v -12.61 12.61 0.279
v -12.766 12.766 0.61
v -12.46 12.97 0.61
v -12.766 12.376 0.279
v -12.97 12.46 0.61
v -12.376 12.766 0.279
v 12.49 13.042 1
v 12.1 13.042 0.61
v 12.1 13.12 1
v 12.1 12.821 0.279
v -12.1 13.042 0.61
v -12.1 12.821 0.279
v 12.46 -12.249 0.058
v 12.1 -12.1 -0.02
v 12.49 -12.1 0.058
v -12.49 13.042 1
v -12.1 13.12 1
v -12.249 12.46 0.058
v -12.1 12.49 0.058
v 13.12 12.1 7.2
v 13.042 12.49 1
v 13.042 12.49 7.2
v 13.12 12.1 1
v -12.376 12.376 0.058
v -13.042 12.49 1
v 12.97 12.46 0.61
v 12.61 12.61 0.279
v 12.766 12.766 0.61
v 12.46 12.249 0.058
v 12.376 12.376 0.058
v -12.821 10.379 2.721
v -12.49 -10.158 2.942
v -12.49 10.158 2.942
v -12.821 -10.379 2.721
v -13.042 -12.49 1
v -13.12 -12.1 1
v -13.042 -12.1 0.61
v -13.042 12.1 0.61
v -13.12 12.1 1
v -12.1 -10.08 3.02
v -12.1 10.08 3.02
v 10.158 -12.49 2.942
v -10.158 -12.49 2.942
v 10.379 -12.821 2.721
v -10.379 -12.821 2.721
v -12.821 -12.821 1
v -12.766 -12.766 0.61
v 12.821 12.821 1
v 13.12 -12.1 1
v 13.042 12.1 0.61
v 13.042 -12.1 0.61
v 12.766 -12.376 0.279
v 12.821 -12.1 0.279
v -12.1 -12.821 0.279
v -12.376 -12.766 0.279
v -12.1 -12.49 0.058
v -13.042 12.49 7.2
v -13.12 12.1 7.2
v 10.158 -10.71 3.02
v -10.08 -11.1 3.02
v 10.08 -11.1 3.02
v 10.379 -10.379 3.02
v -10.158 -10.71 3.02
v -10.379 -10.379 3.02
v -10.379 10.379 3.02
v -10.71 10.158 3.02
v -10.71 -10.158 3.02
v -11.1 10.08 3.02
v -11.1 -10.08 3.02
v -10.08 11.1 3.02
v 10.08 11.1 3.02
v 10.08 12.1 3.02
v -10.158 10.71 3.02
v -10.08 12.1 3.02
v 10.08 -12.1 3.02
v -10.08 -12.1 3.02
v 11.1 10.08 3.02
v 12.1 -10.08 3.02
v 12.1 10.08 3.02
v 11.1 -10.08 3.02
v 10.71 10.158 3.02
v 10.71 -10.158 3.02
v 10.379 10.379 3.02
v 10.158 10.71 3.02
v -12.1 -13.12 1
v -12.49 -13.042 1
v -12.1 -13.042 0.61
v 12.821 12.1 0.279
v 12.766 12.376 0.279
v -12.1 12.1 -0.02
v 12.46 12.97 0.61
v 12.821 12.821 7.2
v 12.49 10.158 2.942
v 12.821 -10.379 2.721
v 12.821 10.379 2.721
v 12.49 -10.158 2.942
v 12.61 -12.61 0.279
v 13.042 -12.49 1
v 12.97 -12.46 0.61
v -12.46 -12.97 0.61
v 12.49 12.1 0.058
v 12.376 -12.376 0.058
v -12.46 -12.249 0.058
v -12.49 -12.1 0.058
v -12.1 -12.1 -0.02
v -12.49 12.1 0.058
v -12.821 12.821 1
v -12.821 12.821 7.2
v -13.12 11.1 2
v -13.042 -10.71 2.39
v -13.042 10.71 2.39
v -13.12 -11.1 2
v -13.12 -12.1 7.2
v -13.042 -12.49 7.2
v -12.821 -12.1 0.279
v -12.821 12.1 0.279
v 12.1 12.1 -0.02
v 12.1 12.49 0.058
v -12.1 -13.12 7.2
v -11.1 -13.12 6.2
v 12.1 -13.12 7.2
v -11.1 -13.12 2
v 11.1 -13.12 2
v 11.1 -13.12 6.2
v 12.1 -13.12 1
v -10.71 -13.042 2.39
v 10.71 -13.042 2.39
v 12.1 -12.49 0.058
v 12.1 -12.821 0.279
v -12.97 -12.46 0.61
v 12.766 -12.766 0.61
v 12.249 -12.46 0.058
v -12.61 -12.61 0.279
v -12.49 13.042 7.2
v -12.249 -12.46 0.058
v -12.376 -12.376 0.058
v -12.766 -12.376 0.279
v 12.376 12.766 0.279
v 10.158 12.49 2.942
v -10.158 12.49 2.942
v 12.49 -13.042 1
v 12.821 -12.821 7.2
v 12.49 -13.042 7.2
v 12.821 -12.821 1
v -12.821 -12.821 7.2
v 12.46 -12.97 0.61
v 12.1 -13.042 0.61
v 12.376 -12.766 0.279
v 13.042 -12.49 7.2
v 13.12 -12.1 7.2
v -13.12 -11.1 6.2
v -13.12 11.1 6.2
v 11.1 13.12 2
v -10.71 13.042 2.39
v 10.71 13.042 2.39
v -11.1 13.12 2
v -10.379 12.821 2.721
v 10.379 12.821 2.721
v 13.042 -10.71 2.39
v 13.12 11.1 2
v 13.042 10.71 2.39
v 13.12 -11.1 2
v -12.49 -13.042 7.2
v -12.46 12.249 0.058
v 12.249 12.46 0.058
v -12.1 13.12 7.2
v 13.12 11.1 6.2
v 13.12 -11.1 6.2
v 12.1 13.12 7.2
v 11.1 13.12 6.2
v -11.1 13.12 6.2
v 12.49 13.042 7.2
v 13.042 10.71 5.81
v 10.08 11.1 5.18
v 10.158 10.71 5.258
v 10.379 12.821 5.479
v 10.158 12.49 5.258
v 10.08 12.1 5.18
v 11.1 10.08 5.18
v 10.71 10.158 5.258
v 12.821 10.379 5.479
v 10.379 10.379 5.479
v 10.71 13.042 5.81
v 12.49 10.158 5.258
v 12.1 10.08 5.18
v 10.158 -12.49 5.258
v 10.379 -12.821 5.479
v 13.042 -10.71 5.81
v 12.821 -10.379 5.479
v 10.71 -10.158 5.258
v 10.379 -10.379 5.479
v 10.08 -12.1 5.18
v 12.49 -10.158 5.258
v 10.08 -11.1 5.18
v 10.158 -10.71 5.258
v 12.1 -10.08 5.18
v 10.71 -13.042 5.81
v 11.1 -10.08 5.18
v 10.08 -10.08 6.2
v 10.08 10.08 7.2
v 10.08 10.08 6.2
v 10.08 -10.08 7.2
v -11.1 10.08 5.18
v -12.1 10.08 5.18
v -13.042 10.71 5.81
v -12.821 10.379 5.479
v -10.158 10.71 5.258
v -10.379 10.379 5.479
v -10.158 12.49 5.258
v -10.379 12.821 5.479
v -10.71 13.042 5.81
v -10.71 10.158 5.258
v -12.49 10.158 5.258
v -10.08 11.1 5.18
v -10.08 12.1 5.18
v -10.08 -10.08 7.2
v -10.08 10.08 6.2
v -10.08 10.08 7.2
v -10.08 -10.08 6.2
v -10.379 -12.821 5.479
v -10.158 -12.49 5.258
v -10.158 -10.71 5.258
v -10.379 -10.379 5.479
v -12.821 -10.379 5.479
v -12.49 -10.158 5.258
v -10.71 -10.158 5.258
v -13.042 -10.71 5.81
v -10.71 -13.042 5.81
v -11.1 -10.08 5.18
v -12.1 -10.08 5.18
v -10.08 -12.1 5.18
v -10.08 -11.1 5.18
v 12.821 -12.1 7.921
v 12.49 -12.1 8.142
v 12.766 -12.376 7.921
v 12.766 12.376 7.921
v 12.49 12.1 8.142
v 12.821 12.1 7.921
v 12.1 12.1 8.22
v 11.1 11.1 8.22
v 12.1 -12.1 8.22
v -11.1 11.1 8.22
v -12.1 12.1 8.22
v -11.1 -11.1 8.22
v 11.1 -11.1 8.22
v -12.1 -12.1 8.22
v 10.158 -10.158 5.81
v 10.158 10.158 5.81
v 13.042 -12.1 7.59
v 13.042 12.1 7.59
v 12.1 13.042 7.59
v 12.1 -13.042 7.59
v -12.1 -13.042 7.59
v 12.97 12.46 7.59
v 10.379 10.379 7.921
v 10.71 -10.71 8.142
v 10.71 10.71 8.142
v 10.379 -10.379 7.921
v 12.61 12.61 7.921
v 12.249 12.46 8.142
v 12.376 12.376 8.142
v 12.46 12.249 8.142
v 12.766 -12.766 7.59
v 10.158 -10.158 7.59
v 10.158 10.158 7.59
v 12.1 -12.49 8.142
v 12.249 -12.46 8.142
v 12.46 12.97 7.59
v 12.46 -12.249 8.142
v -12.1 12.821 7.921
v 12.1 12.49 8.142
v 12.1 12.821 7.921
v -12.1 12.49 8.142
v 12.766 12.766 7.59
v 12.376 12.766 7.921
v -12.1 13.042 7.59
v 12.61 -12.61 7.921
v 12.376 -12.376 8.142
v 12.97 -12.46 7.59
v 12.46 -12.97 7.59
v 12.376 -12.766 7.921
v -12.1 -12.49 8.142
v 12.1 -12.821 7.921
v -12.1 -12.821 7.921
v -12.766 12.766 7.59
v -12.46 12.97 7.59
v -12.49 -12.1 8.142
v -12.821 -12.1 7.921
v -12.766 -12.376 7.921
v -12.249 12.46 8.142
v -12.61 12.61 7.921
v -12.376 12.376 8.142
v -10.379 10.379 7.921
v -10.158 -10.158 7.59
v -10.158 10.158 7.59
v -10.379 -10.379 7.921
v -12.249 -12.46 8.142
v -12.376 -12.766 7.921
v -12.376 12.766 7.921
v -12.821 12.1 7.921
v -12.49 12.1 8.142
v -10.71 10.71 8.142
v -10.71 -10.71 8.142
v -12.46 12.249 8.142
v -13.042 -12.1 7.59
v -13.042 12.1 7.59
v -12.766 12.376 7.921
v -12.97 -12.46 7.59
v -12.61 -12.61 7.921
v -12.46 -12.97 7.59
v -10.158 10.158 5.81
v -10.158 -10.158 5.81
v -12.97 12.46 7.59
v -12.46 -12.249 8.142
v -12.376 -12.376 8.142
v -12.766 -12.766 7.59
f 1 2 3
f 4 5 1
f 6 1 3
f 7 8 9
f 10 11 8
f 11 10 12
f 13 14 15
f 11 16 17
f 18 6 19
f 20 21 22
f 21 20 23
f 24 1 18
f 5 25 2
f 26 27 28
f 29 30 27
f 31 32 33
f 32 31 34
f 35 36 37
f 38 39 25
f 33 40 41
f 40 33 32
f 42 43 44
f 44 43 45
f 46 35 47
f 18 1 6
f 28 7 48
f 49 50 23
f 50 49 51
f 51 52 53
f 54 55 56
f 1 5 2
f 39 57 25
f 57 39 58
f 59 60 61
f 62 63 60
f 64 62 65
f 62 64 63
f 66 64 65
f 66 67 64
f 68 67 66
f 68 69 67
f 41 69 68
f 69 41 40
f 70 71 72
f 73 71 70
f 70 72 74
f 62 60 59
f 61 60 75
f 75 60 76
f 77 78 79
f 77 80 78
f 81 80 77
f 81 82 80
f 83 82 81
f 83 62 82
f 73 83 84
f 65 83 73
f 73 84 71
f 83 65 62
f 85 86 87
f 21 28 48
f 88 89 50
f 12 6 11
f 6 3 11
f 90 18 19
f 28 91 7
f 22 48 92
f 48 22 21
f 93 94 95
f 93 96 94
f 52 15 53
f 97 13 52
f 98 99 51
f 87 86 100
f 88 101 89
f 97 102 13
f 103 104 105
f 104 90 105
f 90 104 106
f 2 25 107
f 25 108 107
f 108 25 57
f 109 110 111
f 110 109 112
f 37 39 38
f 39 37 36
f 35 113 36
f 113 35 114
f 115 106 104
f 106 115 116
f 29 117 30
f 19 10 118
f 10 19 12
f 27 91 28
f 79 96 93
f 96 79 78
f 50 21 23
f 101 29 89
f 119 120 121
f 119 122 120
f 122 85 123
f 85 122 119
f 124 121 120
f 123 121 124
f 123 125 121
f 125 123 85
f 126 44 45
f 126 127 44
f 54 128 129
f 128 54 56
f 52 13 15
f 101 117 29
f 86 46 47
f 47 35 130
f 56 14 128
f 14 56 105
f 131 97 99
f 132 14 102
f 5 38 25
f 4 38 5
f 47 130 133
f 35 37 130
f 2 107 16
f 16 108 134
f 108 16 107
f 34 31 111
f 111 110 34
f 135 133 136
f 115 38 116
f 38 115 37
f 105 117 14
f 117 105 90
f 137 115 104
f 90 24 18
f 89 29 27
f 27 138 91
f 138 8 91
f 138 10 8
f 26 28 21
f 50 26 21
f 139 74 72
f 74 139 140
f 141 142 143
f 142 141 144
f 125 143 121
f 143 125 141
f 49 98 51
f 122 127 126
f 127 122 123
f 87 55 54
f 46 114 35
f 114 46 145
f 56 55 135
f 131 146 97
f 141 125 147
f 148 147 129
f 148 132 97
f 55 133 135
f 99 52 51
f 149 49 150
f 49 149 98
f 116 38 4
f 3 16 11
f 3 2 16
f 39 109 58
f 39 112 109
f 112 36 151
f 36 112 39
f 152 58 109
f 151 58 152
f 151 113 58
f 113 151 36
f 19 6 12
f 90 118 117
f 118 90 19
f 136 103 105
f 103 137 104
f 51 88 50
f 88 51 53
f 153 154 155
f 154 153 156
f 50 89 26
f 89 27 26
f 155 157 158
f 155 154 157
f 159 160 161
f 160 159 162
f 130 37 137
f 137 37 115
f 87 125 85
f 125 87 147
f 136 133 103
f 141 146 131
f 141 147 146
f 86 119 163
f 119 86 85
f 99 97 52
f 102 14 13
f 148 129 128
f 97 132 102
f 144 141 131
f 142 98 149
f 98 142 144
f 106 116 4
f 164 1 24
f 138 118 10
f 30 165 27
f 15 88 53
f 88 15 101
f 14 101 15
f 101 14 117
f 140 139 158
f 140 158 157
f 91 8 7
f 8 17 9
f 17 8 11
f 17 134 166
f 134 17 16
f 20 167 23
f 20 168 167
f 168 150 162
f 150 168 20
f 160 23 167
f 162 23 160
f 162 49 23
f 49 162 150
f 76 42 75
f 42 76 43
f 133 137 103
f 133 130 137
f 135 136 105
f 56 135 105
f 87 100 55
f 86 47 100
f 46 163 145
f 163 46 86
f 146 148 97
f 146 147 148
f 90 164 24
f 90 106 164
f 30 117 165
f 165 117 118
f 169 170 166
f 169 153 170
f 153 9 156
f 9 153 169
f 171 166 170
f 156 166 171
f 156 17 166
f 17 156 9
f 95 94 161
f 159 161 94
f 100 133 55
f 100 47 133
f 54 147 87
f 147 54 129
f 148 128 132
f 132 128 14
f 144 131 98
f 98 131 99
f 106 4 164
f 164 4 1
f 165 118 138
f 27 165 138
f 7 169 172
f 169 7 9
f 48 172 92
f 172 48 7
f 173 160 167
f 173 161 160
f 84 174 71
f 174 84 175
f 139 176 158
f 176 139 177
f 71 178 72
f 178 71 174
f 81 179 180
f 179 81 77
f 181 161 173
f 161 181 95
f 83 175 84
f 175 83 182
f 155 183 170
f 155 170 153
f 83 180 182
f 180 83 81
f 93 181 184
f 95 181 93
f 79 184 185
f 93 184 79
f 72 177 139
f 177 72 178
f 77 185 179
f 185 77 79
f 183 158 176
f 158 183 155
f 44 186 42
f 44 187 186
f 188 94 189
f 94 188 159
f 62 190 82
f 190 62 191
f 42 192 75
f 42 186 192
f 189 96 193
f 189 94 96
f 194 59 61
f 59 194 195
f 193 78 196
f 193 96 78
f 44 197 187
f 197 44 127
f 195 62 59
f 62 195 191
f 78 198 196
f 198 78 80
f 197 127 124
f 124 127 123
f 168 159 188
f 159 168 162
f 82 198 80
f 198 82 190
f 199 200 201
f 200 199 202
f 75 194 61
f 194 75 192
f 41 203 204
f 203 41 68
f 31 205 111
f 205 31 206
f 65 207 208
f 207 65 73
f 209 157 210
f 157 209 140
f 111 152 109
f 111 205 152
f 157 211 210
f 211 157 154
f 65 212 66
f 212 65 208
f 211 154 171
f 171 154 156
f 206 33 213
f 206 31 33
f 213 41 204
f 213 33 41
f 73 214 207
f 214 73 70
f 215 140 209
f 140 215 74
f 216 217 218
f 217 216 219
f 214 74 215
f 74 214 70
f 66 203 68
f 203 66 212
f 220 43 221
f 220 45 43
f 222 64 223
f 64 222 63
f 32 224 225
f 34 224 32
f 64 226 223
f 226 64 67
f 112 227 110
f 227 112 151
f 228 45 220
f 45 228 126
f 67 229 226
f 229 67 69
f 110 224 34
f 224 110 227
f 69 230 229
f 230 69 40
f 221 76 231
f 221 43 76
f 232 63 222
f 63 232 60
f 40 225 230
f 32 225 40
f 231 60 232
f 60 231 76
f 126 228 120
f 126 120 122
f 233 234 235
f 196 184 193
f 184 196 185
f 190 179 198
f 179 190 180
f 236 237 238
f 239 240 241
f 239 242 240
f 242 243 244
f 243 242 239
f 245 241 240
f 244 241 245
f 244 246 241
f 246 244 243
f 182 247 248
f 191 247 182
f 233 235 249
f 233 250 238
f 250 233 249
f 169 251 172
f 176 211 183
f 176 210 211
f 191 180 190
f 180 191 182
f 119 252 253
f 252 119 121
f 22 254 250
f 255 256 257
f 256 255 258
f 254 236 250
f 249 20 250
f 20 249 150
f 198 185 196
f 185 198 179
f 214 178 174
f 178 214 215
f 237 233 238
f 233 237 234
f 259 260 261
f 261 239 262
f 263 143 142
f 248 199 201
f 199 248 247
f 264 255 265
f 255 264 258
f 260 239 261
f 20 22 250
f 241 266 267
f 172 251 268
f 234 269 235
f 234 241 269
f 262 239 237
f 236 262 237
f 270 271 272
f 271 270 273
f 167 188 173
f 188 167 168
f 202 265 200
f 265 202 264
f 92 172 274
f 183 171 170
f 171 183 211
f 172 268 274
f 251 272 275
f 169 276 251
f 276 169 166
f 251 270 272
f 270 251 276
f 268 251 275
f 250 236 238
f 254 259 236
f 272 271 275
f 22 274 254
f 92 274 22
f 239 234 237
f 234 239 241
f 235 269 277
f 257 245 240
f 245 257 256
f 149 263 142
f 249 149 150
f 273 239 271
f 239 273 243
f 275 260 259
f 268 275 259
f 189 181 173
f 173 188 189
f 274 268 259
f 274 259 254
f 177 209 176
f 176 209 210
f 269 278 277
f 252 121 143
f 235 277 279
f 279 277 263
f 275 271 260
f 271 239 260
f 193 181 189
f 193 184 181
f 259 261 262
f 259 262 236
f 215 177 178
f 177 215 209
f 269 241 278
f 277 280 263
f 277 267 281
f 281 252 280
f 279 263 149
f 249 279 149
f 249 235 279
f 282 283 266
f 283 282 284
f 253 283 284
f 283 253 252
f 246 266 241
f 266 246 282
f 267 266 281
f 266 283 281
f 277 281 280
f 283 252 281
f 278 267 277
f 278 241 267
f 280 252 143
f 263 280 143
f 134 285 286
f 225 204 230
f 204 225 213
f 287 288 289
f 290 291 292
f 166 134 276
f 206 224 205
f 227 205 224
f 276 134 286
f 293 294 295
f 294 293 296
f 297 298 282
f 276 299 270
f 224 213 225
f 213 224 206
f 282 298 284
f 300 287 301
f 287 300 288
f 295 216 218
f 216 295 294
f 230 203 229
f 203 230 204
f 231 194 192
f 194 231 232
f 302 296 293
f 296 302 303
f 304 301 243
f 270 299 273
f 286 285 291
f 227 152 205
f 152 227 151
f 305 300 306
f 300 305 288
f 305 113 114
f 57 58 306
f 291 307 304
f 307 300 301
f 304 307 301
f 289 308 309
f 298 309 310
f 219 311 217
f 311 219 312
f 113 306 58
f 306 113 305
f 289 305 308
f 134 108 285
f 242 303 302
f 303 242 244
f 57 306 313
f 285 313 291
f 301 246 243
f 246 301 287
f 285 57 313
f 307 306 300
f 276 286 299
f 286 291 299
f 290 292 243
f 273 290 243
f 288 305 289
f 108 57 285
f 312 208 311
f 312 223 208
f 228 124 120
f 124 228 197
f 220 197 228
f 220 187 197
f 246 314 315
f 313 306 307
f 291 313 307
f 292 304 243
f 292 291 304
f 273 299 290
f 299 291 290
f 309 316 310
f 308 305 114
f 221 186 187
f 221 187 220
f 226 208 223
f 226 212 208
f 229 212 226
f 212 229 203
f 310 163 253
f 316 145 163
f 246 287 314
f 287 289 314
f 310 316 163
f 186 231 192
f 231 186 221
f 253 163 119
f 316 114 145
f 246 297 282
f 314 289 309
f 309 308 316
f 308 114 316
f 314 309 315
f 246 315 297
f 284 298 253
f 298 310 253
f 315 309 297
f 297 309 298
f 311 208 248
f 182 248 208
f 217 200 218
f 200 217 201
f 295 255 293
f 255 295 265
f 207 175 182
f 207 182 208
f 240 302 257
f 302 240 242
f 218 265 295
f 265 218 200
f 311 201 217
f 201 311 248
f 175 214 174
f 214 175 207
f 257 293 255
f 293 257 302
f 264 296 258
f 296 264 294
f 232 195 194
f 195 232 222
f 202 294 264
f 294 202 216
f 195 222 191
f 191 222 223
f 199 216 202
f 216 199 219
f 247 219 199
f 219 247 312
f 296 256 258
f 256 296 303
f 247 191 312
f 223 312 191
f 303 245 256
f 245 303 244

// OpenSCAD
include <BOSL/shapes.scad>
include <BOSL/constants.scad>

strap_w = 20;
strap_h = 2;
wiggle = 0.1 * 2;   // 0.1mm on each width & height

thick = 3;          // Thickness of printed parts
fillet_r = 1;       // Fillet radius

total_w = strap_w + wiggle + (thick * 2);
total_h = (thick * 2) + strap_h + wiggle;

qrtr = total_w / 2 - (thick / 2);

// Rendering settings
$fa=1;
//$fs=2;    // Drafting quality
$fs=0.5;    // Finish quali


union() {
    // Base
    cuboid([total_w, total_w, thick],
            align=V_UP,
            fillet = fillet_r);
    
    // Design choice: I wanted to fillet all of the edges
    // so I've done away with the "difference" approach.
    
    // Arms
    translate([qrtr, qrtr, 0])
        cuboid([thick, thick, total_h],
                align=V_UP,
                fillet= fillet_r);
    translate([qrtr, -qrtr, 0])
        cuboid([thick, thick, total_h],
                align=V_UP,
                fillet= fillet_r);
    translate([-qrtr, qrtr, 0])
        cuboid([thick, thick, total_h],
                align=V_UP,
                fillet= fillet_r);
    translate([-qrtr, -qrtr, 0])
        cuboid([thick, thick, total_h],
                align=V_UP,
                fillet=fillet_r);
    
    // Top
    translate([qrtr, 0, thick + strap_h + wiggle])
        cuboid([thick, total_w, thick],
                align=V_UP,
                fillet=fillet_r);
    translate([-qrtr, 0, thick + strap_h + wiggle])
        cuboid([thick, total_w, thick],
                align=V_UP,
                fillet=fillet_r);
    translate([0, qrtr, thick + strap_h + wiggle])
        cuboid([total_w, thick, thick],
                align=V_UP,
                fillet=fillet_r);
    translate([0, -qrtr, thick + strap_h + wiggle])
        cuboid([total_w, thick, thick],
                align=V_UP,
                fillet=fillet_r);
};
